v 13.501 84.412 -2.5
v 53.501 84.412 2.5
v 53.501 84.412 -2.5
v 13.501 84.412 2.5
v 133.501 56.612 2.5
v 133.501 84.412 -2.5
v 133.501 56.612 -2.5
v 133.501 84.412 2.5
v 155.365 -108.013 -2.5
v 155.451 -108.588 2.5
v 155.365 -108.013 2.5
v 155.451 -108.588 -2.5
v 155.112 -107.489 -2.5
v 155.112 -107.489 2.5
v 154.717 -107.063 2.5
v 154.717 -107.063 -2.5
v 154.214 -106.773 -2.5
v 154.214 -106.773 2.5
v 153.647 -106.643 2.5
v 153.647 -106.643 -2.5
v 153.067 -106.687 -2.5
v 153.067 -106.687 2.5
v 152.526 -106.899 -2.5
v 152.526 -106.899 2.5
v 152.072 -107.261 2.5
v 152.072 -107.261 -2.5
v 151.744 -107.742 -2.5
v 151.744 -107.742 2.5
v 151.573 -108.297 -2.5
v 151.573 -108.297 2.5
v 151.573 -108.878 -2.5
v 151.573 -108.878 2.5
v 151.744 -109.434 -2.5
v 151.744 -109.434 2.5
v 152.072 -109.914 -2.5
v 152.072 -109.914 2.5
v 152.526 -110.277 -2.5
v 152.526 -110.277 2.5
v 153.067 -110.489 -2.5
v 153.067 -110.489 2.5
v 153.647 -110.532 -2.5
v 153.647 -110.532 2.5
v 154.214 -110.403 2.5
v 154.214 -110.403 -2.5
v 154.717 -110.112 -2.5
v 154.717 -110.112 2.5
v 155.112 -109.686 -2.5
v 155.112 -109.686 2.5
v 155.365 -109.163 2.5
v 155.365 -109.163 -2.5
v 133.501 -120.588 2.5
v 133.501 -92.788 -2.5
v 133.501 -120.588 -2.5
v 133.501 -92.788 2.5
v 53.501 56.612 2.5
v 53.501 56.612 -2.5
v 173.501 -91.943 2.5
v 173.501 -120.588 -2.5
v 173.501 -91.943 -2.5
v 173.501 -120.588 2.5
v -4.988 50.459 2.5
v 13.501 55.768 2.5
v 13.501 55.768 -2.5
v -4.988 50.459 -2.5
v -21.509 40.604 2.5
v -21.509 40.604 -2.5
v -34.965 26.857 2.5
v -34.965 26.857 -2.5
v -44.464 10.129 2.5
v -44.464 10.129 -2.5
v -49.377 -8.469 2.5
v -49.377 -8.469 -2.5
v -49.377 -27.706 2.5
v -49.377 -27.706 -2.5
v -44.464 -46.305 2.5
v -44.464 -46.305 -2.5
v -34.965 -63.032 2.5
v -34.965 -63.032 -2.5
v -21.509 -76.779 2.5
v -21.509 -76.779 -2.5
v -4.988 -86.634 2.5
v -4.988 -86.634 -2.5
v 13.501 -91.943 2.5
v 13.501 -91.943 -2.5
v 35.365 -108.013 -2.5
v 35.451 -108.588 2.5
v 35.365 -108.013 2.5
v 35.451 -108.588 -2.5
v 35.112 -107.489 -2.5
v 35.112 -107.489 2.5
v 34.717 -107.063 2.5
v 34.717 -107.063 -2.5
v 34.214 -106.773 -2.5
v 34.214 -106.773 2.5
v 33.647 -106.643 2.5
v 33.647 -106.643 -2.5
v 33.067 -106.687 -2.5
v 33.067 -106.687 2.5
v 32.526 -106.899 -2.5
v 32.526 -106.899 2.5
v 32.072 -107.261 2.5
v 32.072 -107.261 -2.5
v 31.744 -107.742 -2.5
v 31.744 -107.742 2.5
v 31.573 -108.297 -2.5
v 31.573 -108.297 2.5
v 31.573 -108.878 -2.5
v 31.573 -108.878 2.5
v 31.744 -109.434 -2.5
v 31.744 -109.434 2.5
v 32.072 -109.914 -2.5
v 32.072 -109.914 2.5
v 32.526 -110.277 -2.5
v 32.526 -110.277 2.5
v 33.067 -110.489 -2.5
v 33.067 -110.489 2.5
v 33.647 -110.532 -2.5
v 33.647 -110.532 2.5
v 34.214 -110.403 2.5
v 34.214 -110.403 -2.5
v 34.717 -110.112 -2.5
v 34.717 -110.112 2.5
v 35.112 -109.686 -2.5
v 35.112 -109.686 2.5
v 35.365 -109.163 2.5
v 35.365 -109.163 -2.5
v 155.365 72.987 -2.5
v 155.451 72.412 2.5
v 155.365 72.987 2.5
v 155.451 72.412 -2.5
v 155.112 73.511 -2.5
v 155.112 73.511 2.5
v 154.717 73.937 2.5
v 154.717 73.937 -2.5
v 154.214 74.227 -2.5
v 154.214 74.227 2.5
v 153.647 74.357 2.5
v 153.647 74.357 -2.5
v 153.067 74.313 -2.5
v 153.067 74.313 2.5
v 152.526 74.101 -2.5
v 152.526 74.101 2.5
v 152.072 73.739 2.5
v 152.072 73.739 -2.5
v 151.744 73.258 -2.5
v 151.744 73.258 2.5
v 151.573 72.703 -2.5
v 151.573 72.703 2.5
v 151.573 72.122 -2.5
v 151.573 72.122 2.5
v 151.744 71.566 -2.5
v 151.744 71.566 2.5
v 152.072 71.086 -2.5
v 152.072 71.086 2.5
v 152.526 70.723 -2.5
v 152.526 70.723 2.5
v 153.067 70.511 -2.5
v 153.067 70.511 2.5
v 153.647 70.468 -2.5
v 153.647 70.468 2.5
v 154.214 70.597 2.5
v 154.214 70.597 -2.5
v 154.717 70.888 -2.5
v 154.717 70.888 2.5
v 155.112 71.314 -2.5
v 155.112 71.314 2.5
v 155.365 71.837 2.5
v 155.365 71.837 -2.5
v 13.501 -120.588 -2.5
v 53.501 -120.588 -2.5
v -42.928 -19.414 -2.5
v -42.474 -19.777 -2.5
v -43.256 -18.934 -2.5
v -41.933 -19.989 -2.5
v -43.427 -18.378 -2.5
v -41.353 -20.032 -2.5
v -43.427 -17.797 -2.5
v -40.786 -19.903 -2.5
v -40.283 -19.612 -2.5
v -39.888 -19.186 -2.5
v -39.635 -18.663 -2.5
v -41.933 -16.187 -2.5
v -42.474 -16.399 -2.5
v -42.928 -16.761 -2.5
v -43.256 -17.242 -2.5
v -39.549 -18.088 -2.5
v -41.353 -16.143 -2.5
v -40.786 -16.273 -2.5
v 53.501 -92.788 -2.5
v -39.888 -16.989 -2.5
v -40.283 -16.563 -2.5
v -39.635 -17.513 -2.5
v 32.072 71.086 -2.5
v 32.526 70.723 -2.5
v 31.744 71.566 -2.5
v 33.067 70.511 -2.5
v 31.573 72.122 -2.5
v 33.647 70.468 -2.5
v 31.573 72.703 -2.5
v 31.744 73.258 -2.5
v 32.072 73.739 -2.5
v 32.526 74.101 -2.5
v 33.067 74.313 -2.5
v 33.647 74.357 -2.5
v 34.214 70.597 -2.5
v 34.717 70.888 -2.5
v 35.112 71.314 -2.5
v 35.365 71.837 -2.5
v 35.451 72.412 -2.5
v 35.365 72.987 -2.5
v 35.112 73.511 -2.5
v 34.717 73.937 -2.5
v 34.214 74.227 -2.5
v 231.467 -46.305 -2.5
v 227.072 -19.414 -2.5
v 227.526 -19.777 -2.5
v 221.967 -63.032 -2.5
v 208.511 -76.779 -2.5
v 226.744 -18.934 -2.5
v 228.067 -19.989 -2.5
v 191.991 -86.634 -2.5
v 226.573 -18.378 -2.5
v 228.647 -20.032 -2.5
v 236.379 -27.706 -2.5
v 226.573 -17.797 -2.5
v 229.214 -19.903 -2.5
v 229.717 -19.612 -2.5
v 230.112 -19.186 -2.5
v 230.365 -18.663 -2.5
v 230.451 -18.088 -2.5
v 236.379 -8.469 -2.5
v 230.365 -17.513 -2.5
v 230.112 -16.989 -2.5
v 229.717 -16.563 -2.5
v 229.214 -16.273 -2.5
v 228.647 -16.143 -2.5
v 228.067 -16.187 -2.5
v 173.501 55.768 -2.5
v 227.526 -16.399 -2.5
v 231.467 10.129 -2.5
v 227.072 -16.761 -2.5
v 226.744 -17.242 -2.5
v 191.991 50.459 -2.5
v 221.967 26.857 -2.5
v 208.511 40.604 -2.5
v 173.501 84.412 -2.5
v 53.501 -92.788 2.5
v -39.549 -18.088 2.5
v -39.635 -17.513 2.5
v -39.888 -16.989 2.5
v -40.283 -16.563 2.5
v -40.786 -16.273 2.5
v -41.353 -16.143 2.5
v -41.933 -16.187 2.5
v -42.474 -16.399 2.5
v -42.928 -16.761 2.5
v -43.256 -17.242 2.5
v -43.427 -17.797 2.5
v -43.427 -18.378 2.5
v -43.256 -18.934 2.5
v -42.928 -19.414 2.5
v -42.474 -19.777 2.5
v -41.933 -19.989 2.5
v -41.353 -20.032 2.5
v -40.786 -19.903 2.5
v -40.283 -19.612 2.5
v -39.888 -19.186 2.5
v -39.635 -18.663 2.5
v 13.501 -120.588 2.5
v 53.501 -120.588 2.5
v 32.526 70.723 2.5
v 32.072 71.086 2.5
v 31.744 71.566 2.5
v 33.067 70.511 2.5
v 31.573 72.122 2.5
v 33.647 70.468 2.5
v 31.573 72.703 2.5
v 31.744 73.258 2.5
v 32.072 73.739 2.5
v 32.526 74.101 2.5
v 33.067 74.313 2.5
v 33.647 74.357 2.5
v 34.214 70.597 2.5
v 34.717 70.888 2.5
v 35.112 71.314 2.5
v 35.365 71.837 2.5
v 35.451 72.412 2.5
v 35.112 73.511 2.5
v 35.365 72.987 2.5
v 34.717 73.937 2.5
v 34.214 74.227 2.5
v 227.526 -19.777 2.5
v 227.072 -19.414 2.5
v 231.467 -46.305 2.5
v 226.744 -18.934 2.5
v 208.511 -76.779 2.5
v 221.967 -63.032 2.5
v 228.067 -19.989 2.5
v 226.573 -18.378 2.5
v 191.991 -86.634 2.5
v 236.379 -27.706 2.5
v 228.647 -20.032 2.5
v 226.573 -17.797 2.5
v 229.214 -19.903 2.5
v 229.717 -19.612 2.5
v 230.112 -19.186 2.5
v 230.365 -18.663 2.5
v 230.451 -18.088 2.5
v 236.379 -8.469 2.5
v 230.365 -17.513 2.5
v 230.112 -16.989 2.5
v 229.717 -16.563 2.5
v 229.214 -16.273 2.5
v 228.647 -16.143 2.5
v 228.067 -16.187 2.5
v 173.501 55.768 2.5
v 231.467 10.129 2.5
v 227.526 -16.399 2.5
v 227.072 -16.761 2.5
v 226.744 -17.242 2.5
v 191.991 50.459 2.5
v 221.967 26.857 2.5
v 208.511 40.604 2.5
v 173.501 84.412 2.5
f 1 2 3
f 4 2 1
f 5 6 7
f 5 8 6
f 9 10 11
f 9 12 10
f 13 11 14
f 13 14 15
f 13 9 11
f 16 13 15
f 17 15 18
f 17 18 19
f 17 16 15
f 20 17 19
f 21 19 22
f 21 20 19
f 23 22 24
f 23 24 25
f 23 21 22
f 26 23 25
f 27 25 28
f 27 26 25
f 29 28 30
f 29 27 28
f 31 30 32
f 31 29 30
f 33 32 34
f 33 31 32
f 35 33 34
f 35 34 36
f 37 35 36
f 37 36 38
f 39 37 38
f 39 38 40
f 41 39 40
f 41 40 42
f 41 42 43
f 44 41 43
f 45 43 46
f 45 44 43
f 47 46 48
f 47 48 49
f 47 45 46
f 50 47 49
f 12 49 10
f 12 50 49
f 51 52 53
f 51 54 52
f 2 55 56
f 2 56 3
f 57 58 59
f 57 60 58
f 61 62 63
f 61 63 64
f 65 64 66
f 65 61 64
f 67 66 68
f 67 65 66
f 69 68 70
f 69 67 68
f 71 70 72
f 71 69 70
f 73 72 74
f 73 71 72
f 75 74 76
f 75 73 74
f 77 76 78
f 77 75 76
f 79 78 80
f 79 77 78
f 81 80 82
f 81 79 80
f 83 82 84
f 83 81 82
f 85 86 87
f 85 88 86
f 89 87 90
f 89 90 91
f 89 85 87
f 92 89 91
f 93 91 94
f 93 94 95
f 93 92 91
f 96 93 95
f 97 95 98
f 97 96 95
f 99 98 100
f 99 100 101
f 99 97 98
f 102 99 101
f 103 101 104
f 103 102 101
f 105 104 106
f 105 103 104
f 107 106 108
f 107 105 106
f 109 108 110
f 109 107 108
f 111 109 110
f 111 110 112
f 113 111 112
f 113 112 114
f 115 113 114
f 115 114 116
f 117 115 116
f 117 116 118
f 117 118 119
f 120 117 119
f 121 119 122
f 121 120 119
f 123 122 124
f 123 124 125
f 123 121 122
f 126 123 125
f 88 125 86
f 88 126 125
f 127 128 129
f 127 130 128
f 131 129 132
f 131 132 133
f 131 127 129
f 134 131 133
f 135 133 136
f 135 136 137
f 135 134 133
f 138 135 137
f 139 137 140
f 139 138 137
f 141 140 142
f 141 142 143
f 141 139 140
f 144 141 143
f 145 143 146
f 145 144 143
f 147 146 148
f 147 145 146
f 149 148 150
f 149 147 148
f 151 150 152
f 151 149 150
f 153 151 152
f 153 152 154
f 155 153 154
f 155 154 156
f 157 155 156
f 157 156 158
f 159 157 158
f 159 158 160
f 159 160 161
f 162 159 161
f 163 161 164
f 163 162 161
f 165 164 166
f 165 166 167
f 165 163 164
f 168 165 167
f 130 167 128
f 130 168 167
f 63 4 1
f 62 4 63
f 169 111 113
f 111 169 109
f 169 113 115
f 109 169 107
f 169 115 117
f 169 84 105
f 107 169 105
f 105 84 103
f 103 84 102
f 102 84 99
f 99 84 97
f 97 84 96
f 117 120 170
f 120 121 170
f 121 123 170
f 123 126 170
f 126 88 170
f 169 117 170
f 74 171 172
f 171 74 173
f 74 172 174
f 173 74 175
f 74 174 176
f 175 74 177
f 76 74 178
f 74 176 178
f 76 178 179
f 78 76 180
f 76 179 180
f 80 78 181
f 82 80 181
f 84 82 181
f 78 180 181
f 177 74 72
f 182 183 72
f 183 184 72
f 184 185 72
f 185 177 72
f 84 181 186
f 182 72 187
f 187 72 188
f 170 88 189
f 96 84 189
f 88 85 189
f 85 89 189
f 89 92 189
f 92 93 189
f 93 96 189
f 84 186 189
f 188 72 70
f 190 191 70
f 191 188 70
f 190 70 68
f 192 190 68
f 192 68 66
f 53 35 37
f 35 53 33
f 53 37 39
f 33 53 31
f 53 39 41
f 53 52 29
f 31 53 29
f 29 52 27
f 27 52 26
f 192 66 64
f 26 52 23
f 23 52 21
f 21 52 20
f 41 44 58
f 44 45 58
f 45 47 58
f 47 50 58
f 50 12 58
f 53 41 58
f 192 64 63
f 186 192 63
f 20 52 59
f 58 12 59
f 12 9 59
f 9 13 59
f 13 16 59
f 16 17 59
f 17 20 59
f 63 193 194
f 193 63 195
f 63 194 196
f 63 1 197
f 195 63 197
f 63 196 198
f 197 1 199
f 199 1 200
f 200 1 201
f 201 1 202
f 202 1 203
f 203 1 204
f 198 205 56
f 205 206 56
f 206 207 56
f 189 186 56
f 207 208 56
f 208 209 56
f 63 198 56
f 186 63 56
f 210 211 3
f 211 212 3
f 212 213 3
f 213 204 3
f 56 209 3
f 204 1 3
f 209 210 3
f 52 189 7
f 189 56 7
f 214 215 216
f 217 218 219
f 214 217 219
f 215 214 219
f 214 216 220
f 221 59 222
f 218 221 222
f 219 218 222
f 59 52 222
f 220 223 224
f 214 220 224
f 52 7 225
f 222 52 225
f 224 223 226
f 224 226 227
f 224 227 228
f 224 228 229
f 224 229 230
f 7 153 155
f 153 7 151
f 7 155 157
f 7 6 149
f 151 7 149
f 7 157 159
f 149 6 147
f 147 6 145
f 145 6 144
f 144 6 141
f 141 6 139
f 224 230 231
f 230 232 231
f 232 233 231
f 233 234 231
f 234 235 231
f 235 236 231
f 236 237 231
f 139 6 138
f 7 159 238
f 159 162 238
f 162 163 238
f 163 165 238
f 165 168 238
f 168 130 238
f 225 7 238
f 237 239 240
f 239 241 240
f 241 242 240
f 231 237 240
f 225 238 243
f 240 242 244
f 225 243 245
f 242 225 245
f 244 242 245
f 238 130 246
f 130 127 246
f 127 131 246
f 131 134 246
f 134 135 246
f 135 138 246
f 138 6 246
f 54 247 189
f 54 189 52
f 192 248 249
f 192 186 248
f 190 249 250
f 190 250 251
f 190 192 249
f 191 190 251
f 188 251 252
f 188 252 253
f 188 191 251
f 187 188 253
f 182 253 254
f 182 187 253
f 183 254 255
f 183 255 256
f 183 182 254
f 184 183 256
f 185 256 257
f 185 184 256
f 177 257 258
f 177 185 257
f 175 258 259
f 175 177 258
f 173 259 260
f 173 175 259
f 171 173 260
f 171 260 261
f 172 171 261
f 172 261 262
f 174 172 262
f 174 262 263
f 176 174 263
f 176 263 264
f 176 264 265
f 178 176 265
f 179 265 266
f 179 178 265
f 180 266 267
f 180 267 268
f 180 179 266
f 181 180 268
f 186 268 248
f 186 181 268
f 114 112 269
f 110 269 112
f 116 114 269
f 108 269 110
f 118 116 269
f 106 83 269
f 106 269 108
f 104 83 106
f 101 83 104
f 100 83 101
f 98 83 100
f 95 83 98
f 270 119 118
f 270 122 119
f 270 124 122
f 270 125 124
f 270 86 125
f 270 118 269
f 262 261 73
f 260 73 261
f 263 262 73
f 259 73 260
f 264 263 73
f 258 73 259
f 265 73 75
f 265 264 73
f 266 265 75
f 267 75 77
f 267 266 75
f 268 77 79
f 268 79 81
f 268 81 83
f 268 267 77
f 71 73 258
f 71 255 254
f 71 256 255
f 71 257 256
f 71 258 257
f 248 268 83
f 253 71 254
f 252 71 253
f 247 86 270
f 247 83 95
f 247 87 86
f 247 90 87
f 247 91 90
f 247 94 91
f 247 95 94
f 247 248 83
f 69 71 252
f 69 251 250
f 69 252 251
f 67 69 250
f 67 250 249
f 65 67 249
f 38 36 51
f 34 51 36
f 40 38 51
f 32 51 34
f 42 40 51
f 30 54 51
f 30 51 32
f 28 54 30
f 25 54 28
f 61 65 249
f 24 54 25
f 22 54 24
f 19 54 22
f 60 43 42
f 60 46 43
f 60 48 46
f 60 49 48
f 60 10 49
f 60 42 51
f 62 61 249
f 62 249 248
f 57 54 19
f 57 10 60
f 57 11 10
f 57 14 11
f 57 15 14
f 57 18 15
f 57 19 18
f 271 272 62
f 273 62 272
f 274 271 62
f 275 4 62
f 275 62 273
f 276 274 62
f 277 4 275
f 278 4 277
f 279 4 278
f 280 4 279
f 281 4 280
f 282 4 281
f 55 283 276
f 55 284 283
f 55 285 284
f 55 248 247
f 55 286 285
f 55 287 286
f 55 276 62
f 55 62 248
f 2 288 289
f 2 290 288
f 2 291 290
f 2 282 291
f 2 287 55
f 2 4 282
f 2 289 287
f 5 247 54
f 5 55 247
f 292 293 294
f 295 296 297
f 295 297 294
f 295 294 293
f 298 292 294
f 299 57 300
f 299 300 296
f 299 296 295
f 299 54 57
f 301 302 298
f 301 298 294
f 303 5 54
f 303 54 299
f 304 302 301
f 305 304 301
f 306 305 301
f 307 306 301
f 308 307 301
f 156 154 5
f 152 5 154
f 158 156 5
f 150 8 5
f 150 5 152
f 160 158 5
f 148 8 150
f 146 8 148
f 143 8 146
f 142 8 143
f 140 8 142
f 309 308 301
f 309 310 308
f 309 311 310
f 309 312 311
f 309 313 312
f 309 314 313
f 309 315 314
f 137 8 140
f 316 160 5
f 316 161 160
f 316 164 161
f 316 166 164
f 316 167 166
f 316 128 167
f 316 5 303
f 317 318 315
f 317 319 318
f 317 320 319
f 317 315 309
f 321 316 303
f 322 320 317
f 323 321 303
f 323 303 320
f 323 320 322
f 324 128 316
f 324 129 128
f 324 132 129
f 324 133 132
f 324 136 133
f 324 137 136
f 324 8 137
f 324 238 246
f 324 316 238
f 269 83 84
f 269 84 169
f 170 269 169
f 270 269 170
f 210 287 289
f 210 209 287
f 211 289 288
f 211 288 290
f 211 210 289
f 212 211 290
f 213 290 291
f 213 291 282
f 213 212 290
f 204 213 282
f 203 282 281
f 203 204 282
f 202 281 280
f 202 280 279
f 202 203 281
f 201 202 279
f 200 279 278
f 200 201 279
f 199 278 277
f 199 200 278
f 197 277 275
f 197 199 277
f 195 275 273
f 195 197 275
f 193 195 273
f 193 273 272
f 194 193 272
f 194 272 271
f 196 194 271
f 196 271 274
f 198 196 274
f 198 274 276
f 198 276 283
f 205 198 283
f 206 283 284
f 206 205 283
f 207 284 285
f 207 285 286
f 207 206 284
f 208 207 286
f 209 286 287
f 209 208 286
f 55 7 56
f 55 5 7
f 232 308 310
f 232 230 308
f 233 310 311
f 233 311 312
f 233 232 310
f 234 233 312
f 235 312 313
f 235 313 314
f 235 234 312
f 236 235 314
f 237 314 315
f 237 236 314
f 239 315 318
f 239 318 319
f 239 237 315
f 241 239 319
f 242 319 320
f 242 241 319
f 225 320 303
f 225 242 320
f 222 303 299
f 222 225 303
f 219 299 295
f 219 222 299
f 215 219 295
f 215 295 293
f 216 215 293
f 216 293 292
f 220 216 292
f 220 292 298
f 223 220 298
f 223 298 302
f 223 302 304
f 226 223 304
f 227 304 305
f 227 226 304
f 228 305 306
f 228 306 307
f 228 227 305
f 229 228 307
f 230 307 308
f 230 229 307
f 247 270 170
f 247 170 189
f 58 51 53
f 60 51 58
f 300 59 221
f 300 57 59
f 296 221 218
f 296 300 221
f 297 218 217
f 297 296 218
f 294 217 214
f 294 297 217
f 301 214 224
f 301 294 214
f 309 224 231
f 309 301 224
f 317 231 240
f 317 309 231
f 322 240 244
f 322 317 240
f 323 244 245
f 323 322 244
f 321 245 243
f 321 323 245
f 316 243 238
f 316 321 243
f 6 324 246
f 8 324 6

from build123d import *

# Parameters (mm, degrees)
SKETCH1_R           = 1.95
BOSS_EXTRUDE1_DEPTH = 2.5


with BuildPart() as part:
    # Sketch1 → Boss-Extrude1 (new body, symmetric)
    with BuildSketch(Plane.XY):
        with BuildLine():
            Line((133.501154847, 56.612183332), (53.501154847, 56.612183332))
            Line((53.501154847, 56.612183332), (53.501154847, 84.412183332))
            Line((53.501154847, 84.412183332), (13.501154847, 84.412183332))
            Line((13.501154847, 84.412183332), (13.501154847, 55.767785692))
            ThreePointArc((13.501154847, 55.767785692), (-49.998845153, -18.087816668), (13.501154847, -91.943419028))
            Line((13.501154847, -91.943419028), (13.501154847, -120.587816668))
            Line((13.501154847, -120.587816668), (53.501154847, -120.587816668))
            Line((53.501154847, -120.587816668), (53.501154847, -92.787816668))
            Line((53.501154847, -92.787816668), (133.501154847, -92.787816668))
            Line((133.501154847, -92.787816668), (133.501154847, -120.587816668))
            Line((133.501154847, -120.587816668), (173.501154847, -120.587816668))
            Line((173.501154847, -120.587816668), (173.501154847, -91.943419028))
            ThreePointArc((173.501154847, -91.943419028), (237.001154847, -18.087816668), (173.501154847, 55.767785692))
            Line((173.501154847, 55.767785692), (173.501154847, 84.412183332))
            Line((173.501154847, 84.412183332), (133.501154847, 84.412183332))
            Line((133.501154847, 84.412183332), (133.501154847, 56.612183332))
        make_face()
        with Locations((-41.498845153, -18.087816668)):
            Circle(SKETCH1_R, mode=Mode.SUBTRACT)
        with Locations((228.501154847, -18.087816668)):
            Circle(SKETCH1_R, mode=Mode.SUBTRACT)
        with Locations((33.501154847, 72.412183332)):
            Circle(SKETCH1_R, mode=Mode.SUBTRACT)
        with Locations((153.501154847, 72.412183332)):
            Circle(SKETCH1_R, mode=Mode.SUBTRACT)
        with Locations((33.501154847, -108.587816668)):
            Circle(SKETCH1_R, mode=Mode.SUBTRACT)
        with Locations((153.501154847, -108.587816668)):
            Circle(SKETCH1_R, mode=Mode.SUBTRACT)
    extrude(amount=BOSS_EXTRUDE1_DEPTH, both=True)


solid = part.part
